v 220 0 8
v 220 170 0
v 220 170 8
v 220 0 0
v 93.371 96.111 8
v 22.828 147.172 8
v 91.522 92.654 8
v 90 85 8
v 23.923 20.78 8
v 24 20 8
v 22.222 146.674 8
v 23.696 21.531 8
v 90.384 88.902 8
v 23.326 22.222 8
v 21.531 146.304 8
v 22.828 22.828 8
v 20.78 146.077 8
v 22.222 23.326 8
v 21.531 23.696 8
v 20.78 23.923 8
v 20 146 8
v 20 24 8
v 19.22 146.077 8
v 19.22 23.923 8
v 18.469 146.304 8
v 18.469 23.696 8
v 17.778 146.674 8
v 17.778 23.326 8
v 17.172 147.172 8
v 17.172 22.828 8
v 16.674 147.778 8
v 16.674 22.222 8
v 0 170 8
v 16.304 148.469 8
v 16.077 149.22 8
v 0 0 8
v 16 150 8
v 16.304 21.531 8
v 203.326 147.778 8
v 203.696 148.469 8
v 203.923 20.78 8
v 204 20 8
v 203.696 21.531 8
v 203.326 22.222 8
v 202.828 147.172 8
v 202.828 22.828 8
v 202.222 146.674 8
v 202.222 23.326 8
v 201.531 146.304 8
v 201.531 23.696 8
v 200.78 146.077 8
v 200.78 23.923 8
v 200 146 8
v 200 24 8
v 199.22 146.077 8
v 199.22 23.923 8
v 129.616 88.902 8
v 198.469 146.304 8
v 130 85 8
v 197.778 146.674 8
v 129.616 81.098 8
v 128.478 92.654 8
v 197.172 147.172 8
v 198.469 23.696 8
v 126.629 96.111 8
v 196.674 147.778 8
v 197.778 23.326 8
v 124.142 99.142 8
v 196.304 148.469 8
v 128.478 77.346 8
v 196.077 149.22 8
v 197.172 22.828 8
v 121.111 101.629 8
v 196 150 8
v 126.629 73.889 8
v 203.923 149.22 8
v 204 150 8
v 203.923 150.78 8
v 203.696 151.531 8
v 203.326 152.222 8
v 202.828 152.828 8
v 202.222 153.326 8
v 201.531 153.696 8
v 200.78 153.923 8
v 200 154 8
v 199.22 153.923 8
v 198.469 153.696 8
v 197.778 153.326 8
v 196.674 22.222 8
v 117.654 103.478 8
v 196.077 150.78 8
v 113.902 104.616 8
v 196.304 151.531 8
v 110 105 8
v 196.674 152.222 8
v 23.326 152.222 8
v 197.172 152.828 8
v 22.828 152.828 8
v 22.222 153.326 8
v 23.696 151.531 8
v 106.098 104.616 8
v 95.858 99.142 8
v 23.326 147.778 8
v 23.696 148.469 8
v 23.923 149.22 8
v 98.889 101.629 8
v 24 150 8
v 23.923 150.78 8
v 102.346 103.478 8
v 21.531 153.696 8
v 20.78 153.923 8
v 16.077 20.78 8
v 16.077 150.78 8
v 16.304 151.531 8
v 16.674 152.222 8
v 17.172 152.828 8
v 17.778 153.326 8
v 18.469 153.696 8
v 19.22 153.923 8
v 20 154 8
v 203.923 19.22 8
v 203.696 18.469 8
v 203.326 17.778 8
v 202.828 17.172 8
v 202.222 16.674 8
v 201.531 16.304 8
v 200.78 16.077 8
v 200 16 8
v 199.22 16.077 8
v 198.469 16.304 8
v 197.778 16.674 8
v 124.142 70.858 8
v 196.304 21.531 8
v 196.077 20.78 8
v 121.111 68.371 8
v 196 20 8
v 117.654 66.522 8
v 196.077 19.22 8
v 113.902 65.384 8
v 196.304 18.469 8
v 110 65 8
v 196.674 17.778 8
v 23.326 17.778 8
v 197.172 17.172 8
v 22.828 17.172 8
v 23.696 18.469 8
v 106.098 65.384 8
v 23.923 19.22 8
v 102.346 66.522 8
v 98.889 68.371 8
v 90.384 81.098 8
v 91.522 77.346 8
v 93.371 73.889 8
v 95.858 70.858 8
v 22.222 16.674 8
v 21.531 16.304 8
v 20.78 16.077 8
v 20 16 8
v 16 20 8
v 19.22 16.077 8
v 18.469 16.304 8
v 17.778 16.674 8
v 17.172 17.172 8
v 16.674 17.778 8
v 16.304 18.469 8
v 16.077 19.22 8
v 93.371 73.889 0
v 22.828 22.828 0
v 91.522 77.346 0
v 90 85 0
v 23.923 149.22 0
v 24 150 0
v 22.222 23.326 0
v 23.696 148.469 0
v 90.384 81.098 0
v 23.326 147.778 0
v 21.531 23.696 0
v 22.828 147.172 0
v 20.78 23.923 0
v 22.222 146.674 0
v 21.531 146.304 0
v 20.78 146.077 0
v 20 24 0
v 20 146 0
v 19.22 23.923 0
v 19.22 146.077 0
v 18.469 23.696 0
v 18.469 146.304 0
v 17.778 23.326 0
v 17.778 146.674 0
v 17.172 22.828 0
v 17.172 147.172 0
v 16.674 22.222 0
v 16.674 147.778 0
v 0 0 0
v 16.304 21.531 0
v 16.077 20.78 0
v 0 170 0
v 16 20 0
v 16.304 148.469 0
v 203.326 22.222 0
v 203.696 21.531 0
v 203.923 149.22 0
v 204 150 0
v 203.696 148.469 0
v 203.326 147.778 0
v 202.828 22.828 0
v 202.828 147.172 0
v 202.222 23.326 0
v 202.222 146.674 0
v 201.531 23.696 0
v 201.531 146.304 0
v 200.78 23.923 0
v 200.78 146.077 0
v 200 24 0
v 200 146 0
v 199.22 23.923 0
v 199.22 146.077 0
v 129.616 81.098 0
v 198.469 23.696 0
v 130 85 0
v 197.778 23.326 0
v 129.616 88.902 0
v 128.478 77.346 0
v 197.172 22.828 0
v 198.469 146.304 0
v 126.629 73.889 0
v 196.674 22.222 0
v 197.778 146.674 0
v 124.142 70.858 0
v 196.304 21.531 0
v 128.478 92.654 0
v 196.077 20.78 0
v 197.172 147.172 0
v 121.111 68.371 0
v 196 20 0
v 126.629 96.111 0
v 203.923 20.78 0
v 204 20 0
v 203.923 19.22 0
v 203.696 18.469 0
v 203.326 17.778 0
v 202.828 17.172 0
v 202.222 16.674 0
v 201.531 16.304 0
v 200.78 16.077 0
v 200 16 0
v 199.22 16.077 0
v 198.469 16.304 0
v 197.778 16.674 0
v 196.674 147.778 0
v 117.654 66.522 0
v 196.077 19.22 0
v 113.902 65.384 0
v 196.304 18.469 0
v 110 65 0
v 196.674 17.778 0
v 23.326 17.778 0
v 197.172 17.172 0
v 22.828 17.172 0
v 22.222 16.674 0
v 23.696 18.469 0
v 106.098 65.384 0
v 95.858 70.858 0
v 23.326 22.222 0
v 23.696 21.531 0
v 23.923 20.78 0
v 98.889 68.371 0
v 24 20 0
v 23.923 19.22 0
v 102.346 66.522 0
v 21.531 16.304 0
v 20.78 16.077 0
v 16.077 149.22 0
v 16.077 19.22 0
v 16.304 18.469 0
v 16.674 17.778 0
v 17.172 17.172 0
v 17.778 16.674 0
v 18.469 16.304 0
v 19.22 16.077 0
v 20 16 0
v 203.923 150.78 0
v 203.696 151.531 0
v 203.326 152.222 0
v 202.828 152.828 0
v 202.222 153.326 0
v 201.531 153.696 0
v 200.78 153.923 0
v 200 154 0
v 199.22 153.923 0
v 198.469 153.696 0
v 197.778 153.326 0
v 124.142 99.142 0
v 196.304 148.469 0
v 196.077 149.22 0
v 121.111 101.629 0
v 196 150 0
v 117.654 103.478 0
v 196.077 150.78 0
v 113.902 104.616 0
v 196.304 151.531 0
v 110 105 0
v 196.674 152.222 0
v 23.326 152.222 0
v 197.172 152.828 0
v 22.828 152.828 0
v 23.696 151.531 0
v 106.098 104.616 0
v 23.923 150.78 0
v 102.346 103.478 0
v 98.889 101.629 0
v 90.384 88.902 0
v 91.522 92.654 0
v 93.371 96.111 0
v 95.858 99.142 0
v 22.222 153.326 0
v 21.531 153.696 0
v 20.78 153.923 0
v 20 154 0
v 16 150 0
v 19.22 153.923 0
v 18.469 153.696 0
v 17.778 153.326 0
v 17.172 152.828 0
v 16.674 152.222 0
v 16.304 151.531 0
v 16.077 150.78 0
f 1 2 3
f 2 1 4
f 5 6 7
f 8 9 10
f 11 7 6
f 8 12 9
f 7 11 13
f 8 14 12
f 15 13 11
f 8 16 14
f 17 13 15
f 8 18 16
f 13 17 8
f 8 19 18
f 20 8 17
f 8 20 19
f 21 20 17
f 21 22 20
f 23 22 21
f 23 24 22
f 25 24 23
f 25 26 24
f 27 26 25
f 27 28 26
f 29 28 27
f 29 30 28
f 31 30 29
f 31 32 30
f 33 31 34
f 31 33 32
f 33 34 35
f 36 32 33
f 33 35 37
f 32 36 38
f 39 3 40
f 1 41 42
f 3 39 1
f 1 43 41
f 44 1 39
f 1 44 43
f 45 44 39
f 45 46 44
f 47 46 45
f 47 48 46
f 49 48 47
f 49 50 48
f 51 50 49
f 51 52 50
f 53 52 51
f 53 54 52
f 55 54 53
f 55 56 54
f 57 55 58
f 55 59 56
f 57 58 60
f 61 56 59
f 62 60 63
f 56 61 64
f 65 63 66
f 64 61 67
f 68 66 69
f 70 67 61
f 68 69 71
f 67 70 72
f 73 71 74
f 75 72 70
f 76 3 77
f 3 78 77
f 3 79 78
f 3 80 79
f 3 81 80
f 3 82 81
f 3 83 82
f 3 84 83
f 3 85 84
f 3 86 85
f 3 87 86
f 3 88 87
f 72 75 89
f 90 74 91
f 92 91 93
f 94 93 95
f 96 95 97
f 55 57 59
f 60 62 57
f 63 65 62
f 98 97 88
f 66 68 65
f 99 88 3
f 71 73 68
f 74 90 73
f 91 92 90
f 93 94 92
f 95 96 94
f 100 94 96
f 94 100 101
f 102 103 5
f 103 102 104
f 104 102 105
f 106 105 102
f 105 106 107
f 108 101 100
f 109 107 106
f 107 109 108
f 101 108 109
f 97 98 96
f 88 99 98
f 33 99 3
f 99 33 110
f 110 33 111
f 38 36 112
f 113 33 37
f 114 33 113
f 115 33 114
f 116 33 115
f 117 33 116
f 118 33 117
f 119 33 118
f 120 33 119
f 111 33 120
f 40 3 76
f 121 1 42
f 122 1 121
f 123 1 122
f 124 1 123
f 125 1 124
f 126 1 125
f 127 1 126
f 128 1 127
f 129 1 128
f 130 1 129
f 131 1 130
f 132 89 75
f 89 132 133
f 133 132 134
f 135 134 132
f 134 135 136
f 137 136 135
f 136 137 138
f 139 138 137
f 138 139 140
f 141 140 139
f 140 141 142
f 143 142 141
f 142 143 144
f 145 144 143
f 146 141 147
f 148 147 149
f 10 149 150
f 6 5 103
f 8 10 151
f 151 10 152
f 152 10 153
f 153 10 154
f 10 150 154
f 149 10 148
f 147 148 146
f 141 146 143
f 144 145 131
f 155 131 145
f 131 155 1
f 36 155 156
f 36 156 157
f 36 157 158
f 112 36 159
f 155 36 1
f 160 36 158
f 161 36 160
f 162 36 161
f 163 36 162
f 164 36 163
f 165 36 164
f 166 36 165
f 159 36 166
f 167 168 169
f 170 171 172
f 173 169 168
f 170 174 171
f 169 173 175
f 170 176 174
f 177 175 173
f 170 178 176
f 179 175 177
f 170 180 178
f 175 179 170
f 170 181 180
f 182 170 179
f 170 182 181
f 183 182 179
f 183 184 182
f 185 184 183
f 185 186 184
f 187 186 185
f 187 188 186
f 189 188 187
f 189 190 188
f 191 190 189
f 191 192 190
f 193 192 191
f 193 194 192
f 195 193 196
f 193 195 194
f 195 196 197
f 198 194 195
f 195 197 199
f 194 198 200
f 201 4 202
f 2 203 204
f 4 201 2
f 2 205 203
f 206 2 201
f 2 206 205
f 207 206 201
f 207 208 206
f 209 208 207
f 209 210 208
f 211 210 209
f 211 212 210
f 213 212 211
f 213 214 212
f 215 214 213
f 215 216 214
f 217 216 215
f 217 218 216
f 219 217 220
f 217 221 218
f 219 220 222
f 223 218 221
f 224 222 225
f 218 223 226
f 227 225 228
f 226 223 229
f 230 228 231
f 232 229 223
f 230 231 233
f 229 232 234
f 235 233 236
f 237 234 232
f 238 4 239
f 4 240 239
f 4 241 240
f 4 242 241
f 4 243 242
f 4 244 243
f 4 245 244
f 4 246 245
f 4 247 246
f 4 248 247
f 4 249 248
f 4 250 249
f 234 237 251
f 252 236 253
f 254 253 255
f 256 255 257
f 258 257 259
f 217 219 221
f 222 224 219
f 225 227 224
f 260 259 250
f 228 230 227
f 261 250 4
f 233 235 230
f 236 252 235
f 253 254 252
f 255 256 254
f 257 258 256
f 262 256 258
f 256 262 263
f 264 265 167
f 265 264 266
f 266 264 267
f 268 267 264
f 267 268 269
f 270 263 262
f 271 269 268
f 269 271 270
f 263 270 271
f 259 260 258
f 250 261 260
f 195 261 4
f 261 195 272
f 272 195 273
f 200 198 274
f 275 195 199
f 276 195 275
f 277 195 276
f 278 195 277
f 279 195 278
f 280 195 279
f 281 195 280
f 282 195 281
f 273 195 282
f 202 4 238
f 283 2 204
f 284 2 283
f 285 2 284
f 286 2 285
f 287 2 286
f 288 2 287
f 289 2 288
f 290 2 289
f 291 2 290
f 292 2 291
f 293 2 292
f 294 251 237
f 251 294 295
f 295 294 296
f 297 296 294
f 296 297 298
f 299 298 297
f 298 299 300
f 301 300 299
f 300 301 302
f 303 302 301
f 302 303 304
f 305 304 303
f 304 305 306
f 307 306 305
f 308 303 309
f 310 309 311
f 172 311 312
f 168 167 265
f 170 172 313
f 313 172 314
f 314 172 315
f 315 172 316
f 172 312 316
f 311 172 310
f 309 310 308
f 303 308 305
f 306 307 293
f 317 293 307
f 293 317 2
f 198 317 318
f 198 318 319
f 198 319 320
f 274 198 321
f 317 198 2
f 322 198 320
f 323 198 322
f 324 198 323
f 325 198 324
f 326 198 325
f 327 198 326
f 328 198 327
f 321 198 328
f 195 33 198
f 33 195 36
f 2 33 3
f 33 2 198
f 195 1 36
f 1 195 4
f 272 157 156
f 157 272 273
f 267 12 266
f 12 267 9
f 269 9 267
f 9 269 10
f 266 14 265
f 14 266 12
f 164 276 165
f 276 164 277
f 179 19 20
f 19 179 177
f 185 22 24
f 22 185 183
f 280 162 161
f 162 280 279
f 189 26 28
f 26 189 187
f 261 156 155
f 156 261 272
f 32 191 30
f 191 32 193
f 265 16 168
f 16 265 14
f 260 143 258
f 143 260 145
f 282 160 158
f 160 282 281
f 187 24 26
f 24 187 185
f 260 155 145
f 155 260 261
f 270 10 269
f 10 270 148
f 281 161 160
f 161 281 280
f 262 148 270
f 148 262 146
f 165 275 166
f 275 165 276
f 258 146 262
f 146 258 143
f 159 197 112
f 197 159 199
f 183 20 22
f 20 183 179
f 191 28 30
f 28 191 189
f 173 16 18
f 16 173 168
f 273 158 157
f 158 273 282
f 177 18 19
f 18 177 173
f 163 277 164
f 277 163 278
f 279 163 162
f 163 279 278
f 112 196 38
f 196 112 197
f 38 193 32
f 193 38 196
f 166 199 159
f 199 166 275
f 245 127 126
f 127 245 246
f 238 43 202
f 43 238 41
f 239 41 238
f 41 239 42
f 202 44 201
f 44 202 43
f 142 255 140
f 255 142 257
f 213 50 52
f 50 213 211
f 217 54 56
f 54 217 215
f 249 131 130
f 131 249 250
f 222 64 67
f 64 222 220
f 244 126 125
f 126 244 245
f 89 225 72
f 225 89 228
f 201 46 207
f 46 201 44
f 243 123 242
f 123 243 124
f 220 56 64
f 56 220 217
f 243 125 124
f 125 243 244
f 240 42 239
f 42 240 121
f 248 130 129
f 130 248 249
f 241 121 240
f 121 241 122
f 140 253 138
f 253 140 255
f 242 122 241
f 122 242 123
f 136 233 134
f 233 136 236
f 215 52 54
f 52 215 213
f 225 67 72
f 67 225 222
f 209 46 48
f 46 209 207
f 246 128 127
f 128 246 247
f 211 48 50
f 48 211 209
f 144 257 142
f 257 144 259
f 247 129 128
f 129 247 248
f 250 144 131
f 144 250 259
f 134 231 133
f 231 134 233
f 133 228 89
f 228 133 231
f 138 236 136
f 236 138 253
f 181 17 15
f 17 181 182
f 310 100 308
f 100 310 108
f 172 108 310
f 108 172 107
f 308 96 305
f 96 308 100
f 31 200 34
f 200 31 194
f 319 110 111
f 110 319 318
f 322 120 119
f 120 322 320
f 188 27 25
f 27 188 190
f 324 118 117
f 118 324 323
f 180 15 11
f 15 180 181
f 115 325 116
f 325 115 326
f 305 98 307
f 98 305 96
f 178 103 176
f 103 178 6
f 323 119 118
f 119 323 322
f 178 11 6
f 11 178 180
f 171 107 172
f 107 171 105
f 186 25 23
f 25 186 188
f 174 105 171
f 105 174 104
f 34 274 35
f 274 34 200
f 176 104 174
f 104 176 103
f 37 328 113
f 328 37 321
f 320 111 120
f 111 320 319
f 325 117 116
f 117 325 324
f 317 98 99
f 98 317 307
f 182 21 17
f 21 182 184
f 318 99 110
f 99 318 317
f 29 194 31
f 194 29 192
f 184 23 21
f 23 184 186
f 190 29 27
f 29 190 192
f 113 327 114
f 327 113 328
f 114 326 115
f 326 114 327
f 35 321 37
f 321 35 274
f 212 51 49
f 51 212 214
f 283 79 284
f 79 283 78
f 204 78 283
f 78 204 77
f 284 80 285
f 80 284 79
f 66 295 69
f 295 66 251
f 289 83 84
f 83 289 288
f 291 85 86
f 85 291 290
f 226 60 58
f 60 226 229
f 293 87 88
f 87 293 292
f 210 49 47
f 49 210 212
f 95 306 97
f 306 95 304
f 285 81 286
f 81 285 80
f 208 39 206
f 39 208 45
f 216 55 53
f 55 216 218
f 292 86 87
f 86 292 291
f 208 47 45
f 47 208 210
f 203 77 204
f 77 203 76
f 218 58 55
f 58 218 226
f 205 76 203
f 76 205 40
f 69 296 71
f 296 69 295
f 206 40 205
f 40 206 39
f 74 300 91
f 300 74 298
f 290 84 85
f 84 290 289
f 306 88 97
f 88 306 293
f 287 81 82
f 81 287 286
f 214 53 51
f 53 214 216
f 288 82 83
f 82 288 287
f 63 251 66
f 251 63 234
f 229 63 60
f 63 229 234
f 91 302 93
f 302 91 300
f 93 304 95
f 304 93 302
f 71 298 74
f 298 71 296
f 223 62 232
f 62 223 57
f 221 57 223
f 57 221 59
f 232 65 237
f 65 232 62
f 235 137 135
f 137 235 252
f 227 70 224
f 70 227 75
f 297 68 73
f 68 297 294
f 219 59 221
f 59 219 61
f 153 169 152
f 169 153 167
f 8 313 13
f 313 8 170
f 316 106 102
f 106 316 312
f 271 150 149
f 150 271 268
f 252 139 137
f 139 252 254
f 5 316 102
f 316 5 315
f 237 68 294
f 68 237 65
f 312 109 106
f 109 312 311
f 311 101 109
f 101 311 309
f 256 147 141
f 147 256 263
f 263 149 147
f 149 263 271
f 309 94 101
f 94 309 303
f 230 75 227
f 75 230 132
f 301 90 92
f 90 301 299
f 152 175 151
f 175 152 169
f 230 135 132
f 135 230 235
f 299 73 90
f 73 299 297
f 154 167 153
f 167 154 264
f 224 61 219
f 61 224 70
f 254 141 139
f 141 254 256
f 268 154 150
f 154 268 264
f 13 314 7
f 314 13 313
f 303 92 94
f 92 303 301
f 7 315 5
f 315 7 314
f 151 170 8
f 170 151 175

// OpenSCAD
$fn = 32;

// ----------------------------------------------------------------------
// Big plate: 200-250 mm adapter plate
// ----------------------------------------------------------------------

// --- parameters (mm) ---
plate_l = 220;            // plate length, X
plate_w = 170;            // plate width, Y
plate_t = 8;              // plate thickness, Z
corner_d = 8;             // corner hole diameter
corner_in = 20;           // corner hole inset from the edges
bore_d = 40;              // central bore

difference() {
  cube([plate_l, plate_w, plate_t]);
  translate([corner_in, corner_in, -1]) cylinder(h = plate_t + 2, d = corner_d);
  translate([plate_l - corner_in, corner_in, -1]) cylinder(h = plate_t + 2, d = corner_d);
  translate([corner_in, plate_w - corner_in, -1]) cylinder(h = plate_t + 2, d = corner_d);
  translate([plate_l - corner_in, plate_w - corner_in, -1]) cylinder(h = plate_t + 2, d = corner_d);
  translate([plate_l / 2, plate_w / 2, -1]) cylinder(h = plate_t + 2, d = bore_d);
}
